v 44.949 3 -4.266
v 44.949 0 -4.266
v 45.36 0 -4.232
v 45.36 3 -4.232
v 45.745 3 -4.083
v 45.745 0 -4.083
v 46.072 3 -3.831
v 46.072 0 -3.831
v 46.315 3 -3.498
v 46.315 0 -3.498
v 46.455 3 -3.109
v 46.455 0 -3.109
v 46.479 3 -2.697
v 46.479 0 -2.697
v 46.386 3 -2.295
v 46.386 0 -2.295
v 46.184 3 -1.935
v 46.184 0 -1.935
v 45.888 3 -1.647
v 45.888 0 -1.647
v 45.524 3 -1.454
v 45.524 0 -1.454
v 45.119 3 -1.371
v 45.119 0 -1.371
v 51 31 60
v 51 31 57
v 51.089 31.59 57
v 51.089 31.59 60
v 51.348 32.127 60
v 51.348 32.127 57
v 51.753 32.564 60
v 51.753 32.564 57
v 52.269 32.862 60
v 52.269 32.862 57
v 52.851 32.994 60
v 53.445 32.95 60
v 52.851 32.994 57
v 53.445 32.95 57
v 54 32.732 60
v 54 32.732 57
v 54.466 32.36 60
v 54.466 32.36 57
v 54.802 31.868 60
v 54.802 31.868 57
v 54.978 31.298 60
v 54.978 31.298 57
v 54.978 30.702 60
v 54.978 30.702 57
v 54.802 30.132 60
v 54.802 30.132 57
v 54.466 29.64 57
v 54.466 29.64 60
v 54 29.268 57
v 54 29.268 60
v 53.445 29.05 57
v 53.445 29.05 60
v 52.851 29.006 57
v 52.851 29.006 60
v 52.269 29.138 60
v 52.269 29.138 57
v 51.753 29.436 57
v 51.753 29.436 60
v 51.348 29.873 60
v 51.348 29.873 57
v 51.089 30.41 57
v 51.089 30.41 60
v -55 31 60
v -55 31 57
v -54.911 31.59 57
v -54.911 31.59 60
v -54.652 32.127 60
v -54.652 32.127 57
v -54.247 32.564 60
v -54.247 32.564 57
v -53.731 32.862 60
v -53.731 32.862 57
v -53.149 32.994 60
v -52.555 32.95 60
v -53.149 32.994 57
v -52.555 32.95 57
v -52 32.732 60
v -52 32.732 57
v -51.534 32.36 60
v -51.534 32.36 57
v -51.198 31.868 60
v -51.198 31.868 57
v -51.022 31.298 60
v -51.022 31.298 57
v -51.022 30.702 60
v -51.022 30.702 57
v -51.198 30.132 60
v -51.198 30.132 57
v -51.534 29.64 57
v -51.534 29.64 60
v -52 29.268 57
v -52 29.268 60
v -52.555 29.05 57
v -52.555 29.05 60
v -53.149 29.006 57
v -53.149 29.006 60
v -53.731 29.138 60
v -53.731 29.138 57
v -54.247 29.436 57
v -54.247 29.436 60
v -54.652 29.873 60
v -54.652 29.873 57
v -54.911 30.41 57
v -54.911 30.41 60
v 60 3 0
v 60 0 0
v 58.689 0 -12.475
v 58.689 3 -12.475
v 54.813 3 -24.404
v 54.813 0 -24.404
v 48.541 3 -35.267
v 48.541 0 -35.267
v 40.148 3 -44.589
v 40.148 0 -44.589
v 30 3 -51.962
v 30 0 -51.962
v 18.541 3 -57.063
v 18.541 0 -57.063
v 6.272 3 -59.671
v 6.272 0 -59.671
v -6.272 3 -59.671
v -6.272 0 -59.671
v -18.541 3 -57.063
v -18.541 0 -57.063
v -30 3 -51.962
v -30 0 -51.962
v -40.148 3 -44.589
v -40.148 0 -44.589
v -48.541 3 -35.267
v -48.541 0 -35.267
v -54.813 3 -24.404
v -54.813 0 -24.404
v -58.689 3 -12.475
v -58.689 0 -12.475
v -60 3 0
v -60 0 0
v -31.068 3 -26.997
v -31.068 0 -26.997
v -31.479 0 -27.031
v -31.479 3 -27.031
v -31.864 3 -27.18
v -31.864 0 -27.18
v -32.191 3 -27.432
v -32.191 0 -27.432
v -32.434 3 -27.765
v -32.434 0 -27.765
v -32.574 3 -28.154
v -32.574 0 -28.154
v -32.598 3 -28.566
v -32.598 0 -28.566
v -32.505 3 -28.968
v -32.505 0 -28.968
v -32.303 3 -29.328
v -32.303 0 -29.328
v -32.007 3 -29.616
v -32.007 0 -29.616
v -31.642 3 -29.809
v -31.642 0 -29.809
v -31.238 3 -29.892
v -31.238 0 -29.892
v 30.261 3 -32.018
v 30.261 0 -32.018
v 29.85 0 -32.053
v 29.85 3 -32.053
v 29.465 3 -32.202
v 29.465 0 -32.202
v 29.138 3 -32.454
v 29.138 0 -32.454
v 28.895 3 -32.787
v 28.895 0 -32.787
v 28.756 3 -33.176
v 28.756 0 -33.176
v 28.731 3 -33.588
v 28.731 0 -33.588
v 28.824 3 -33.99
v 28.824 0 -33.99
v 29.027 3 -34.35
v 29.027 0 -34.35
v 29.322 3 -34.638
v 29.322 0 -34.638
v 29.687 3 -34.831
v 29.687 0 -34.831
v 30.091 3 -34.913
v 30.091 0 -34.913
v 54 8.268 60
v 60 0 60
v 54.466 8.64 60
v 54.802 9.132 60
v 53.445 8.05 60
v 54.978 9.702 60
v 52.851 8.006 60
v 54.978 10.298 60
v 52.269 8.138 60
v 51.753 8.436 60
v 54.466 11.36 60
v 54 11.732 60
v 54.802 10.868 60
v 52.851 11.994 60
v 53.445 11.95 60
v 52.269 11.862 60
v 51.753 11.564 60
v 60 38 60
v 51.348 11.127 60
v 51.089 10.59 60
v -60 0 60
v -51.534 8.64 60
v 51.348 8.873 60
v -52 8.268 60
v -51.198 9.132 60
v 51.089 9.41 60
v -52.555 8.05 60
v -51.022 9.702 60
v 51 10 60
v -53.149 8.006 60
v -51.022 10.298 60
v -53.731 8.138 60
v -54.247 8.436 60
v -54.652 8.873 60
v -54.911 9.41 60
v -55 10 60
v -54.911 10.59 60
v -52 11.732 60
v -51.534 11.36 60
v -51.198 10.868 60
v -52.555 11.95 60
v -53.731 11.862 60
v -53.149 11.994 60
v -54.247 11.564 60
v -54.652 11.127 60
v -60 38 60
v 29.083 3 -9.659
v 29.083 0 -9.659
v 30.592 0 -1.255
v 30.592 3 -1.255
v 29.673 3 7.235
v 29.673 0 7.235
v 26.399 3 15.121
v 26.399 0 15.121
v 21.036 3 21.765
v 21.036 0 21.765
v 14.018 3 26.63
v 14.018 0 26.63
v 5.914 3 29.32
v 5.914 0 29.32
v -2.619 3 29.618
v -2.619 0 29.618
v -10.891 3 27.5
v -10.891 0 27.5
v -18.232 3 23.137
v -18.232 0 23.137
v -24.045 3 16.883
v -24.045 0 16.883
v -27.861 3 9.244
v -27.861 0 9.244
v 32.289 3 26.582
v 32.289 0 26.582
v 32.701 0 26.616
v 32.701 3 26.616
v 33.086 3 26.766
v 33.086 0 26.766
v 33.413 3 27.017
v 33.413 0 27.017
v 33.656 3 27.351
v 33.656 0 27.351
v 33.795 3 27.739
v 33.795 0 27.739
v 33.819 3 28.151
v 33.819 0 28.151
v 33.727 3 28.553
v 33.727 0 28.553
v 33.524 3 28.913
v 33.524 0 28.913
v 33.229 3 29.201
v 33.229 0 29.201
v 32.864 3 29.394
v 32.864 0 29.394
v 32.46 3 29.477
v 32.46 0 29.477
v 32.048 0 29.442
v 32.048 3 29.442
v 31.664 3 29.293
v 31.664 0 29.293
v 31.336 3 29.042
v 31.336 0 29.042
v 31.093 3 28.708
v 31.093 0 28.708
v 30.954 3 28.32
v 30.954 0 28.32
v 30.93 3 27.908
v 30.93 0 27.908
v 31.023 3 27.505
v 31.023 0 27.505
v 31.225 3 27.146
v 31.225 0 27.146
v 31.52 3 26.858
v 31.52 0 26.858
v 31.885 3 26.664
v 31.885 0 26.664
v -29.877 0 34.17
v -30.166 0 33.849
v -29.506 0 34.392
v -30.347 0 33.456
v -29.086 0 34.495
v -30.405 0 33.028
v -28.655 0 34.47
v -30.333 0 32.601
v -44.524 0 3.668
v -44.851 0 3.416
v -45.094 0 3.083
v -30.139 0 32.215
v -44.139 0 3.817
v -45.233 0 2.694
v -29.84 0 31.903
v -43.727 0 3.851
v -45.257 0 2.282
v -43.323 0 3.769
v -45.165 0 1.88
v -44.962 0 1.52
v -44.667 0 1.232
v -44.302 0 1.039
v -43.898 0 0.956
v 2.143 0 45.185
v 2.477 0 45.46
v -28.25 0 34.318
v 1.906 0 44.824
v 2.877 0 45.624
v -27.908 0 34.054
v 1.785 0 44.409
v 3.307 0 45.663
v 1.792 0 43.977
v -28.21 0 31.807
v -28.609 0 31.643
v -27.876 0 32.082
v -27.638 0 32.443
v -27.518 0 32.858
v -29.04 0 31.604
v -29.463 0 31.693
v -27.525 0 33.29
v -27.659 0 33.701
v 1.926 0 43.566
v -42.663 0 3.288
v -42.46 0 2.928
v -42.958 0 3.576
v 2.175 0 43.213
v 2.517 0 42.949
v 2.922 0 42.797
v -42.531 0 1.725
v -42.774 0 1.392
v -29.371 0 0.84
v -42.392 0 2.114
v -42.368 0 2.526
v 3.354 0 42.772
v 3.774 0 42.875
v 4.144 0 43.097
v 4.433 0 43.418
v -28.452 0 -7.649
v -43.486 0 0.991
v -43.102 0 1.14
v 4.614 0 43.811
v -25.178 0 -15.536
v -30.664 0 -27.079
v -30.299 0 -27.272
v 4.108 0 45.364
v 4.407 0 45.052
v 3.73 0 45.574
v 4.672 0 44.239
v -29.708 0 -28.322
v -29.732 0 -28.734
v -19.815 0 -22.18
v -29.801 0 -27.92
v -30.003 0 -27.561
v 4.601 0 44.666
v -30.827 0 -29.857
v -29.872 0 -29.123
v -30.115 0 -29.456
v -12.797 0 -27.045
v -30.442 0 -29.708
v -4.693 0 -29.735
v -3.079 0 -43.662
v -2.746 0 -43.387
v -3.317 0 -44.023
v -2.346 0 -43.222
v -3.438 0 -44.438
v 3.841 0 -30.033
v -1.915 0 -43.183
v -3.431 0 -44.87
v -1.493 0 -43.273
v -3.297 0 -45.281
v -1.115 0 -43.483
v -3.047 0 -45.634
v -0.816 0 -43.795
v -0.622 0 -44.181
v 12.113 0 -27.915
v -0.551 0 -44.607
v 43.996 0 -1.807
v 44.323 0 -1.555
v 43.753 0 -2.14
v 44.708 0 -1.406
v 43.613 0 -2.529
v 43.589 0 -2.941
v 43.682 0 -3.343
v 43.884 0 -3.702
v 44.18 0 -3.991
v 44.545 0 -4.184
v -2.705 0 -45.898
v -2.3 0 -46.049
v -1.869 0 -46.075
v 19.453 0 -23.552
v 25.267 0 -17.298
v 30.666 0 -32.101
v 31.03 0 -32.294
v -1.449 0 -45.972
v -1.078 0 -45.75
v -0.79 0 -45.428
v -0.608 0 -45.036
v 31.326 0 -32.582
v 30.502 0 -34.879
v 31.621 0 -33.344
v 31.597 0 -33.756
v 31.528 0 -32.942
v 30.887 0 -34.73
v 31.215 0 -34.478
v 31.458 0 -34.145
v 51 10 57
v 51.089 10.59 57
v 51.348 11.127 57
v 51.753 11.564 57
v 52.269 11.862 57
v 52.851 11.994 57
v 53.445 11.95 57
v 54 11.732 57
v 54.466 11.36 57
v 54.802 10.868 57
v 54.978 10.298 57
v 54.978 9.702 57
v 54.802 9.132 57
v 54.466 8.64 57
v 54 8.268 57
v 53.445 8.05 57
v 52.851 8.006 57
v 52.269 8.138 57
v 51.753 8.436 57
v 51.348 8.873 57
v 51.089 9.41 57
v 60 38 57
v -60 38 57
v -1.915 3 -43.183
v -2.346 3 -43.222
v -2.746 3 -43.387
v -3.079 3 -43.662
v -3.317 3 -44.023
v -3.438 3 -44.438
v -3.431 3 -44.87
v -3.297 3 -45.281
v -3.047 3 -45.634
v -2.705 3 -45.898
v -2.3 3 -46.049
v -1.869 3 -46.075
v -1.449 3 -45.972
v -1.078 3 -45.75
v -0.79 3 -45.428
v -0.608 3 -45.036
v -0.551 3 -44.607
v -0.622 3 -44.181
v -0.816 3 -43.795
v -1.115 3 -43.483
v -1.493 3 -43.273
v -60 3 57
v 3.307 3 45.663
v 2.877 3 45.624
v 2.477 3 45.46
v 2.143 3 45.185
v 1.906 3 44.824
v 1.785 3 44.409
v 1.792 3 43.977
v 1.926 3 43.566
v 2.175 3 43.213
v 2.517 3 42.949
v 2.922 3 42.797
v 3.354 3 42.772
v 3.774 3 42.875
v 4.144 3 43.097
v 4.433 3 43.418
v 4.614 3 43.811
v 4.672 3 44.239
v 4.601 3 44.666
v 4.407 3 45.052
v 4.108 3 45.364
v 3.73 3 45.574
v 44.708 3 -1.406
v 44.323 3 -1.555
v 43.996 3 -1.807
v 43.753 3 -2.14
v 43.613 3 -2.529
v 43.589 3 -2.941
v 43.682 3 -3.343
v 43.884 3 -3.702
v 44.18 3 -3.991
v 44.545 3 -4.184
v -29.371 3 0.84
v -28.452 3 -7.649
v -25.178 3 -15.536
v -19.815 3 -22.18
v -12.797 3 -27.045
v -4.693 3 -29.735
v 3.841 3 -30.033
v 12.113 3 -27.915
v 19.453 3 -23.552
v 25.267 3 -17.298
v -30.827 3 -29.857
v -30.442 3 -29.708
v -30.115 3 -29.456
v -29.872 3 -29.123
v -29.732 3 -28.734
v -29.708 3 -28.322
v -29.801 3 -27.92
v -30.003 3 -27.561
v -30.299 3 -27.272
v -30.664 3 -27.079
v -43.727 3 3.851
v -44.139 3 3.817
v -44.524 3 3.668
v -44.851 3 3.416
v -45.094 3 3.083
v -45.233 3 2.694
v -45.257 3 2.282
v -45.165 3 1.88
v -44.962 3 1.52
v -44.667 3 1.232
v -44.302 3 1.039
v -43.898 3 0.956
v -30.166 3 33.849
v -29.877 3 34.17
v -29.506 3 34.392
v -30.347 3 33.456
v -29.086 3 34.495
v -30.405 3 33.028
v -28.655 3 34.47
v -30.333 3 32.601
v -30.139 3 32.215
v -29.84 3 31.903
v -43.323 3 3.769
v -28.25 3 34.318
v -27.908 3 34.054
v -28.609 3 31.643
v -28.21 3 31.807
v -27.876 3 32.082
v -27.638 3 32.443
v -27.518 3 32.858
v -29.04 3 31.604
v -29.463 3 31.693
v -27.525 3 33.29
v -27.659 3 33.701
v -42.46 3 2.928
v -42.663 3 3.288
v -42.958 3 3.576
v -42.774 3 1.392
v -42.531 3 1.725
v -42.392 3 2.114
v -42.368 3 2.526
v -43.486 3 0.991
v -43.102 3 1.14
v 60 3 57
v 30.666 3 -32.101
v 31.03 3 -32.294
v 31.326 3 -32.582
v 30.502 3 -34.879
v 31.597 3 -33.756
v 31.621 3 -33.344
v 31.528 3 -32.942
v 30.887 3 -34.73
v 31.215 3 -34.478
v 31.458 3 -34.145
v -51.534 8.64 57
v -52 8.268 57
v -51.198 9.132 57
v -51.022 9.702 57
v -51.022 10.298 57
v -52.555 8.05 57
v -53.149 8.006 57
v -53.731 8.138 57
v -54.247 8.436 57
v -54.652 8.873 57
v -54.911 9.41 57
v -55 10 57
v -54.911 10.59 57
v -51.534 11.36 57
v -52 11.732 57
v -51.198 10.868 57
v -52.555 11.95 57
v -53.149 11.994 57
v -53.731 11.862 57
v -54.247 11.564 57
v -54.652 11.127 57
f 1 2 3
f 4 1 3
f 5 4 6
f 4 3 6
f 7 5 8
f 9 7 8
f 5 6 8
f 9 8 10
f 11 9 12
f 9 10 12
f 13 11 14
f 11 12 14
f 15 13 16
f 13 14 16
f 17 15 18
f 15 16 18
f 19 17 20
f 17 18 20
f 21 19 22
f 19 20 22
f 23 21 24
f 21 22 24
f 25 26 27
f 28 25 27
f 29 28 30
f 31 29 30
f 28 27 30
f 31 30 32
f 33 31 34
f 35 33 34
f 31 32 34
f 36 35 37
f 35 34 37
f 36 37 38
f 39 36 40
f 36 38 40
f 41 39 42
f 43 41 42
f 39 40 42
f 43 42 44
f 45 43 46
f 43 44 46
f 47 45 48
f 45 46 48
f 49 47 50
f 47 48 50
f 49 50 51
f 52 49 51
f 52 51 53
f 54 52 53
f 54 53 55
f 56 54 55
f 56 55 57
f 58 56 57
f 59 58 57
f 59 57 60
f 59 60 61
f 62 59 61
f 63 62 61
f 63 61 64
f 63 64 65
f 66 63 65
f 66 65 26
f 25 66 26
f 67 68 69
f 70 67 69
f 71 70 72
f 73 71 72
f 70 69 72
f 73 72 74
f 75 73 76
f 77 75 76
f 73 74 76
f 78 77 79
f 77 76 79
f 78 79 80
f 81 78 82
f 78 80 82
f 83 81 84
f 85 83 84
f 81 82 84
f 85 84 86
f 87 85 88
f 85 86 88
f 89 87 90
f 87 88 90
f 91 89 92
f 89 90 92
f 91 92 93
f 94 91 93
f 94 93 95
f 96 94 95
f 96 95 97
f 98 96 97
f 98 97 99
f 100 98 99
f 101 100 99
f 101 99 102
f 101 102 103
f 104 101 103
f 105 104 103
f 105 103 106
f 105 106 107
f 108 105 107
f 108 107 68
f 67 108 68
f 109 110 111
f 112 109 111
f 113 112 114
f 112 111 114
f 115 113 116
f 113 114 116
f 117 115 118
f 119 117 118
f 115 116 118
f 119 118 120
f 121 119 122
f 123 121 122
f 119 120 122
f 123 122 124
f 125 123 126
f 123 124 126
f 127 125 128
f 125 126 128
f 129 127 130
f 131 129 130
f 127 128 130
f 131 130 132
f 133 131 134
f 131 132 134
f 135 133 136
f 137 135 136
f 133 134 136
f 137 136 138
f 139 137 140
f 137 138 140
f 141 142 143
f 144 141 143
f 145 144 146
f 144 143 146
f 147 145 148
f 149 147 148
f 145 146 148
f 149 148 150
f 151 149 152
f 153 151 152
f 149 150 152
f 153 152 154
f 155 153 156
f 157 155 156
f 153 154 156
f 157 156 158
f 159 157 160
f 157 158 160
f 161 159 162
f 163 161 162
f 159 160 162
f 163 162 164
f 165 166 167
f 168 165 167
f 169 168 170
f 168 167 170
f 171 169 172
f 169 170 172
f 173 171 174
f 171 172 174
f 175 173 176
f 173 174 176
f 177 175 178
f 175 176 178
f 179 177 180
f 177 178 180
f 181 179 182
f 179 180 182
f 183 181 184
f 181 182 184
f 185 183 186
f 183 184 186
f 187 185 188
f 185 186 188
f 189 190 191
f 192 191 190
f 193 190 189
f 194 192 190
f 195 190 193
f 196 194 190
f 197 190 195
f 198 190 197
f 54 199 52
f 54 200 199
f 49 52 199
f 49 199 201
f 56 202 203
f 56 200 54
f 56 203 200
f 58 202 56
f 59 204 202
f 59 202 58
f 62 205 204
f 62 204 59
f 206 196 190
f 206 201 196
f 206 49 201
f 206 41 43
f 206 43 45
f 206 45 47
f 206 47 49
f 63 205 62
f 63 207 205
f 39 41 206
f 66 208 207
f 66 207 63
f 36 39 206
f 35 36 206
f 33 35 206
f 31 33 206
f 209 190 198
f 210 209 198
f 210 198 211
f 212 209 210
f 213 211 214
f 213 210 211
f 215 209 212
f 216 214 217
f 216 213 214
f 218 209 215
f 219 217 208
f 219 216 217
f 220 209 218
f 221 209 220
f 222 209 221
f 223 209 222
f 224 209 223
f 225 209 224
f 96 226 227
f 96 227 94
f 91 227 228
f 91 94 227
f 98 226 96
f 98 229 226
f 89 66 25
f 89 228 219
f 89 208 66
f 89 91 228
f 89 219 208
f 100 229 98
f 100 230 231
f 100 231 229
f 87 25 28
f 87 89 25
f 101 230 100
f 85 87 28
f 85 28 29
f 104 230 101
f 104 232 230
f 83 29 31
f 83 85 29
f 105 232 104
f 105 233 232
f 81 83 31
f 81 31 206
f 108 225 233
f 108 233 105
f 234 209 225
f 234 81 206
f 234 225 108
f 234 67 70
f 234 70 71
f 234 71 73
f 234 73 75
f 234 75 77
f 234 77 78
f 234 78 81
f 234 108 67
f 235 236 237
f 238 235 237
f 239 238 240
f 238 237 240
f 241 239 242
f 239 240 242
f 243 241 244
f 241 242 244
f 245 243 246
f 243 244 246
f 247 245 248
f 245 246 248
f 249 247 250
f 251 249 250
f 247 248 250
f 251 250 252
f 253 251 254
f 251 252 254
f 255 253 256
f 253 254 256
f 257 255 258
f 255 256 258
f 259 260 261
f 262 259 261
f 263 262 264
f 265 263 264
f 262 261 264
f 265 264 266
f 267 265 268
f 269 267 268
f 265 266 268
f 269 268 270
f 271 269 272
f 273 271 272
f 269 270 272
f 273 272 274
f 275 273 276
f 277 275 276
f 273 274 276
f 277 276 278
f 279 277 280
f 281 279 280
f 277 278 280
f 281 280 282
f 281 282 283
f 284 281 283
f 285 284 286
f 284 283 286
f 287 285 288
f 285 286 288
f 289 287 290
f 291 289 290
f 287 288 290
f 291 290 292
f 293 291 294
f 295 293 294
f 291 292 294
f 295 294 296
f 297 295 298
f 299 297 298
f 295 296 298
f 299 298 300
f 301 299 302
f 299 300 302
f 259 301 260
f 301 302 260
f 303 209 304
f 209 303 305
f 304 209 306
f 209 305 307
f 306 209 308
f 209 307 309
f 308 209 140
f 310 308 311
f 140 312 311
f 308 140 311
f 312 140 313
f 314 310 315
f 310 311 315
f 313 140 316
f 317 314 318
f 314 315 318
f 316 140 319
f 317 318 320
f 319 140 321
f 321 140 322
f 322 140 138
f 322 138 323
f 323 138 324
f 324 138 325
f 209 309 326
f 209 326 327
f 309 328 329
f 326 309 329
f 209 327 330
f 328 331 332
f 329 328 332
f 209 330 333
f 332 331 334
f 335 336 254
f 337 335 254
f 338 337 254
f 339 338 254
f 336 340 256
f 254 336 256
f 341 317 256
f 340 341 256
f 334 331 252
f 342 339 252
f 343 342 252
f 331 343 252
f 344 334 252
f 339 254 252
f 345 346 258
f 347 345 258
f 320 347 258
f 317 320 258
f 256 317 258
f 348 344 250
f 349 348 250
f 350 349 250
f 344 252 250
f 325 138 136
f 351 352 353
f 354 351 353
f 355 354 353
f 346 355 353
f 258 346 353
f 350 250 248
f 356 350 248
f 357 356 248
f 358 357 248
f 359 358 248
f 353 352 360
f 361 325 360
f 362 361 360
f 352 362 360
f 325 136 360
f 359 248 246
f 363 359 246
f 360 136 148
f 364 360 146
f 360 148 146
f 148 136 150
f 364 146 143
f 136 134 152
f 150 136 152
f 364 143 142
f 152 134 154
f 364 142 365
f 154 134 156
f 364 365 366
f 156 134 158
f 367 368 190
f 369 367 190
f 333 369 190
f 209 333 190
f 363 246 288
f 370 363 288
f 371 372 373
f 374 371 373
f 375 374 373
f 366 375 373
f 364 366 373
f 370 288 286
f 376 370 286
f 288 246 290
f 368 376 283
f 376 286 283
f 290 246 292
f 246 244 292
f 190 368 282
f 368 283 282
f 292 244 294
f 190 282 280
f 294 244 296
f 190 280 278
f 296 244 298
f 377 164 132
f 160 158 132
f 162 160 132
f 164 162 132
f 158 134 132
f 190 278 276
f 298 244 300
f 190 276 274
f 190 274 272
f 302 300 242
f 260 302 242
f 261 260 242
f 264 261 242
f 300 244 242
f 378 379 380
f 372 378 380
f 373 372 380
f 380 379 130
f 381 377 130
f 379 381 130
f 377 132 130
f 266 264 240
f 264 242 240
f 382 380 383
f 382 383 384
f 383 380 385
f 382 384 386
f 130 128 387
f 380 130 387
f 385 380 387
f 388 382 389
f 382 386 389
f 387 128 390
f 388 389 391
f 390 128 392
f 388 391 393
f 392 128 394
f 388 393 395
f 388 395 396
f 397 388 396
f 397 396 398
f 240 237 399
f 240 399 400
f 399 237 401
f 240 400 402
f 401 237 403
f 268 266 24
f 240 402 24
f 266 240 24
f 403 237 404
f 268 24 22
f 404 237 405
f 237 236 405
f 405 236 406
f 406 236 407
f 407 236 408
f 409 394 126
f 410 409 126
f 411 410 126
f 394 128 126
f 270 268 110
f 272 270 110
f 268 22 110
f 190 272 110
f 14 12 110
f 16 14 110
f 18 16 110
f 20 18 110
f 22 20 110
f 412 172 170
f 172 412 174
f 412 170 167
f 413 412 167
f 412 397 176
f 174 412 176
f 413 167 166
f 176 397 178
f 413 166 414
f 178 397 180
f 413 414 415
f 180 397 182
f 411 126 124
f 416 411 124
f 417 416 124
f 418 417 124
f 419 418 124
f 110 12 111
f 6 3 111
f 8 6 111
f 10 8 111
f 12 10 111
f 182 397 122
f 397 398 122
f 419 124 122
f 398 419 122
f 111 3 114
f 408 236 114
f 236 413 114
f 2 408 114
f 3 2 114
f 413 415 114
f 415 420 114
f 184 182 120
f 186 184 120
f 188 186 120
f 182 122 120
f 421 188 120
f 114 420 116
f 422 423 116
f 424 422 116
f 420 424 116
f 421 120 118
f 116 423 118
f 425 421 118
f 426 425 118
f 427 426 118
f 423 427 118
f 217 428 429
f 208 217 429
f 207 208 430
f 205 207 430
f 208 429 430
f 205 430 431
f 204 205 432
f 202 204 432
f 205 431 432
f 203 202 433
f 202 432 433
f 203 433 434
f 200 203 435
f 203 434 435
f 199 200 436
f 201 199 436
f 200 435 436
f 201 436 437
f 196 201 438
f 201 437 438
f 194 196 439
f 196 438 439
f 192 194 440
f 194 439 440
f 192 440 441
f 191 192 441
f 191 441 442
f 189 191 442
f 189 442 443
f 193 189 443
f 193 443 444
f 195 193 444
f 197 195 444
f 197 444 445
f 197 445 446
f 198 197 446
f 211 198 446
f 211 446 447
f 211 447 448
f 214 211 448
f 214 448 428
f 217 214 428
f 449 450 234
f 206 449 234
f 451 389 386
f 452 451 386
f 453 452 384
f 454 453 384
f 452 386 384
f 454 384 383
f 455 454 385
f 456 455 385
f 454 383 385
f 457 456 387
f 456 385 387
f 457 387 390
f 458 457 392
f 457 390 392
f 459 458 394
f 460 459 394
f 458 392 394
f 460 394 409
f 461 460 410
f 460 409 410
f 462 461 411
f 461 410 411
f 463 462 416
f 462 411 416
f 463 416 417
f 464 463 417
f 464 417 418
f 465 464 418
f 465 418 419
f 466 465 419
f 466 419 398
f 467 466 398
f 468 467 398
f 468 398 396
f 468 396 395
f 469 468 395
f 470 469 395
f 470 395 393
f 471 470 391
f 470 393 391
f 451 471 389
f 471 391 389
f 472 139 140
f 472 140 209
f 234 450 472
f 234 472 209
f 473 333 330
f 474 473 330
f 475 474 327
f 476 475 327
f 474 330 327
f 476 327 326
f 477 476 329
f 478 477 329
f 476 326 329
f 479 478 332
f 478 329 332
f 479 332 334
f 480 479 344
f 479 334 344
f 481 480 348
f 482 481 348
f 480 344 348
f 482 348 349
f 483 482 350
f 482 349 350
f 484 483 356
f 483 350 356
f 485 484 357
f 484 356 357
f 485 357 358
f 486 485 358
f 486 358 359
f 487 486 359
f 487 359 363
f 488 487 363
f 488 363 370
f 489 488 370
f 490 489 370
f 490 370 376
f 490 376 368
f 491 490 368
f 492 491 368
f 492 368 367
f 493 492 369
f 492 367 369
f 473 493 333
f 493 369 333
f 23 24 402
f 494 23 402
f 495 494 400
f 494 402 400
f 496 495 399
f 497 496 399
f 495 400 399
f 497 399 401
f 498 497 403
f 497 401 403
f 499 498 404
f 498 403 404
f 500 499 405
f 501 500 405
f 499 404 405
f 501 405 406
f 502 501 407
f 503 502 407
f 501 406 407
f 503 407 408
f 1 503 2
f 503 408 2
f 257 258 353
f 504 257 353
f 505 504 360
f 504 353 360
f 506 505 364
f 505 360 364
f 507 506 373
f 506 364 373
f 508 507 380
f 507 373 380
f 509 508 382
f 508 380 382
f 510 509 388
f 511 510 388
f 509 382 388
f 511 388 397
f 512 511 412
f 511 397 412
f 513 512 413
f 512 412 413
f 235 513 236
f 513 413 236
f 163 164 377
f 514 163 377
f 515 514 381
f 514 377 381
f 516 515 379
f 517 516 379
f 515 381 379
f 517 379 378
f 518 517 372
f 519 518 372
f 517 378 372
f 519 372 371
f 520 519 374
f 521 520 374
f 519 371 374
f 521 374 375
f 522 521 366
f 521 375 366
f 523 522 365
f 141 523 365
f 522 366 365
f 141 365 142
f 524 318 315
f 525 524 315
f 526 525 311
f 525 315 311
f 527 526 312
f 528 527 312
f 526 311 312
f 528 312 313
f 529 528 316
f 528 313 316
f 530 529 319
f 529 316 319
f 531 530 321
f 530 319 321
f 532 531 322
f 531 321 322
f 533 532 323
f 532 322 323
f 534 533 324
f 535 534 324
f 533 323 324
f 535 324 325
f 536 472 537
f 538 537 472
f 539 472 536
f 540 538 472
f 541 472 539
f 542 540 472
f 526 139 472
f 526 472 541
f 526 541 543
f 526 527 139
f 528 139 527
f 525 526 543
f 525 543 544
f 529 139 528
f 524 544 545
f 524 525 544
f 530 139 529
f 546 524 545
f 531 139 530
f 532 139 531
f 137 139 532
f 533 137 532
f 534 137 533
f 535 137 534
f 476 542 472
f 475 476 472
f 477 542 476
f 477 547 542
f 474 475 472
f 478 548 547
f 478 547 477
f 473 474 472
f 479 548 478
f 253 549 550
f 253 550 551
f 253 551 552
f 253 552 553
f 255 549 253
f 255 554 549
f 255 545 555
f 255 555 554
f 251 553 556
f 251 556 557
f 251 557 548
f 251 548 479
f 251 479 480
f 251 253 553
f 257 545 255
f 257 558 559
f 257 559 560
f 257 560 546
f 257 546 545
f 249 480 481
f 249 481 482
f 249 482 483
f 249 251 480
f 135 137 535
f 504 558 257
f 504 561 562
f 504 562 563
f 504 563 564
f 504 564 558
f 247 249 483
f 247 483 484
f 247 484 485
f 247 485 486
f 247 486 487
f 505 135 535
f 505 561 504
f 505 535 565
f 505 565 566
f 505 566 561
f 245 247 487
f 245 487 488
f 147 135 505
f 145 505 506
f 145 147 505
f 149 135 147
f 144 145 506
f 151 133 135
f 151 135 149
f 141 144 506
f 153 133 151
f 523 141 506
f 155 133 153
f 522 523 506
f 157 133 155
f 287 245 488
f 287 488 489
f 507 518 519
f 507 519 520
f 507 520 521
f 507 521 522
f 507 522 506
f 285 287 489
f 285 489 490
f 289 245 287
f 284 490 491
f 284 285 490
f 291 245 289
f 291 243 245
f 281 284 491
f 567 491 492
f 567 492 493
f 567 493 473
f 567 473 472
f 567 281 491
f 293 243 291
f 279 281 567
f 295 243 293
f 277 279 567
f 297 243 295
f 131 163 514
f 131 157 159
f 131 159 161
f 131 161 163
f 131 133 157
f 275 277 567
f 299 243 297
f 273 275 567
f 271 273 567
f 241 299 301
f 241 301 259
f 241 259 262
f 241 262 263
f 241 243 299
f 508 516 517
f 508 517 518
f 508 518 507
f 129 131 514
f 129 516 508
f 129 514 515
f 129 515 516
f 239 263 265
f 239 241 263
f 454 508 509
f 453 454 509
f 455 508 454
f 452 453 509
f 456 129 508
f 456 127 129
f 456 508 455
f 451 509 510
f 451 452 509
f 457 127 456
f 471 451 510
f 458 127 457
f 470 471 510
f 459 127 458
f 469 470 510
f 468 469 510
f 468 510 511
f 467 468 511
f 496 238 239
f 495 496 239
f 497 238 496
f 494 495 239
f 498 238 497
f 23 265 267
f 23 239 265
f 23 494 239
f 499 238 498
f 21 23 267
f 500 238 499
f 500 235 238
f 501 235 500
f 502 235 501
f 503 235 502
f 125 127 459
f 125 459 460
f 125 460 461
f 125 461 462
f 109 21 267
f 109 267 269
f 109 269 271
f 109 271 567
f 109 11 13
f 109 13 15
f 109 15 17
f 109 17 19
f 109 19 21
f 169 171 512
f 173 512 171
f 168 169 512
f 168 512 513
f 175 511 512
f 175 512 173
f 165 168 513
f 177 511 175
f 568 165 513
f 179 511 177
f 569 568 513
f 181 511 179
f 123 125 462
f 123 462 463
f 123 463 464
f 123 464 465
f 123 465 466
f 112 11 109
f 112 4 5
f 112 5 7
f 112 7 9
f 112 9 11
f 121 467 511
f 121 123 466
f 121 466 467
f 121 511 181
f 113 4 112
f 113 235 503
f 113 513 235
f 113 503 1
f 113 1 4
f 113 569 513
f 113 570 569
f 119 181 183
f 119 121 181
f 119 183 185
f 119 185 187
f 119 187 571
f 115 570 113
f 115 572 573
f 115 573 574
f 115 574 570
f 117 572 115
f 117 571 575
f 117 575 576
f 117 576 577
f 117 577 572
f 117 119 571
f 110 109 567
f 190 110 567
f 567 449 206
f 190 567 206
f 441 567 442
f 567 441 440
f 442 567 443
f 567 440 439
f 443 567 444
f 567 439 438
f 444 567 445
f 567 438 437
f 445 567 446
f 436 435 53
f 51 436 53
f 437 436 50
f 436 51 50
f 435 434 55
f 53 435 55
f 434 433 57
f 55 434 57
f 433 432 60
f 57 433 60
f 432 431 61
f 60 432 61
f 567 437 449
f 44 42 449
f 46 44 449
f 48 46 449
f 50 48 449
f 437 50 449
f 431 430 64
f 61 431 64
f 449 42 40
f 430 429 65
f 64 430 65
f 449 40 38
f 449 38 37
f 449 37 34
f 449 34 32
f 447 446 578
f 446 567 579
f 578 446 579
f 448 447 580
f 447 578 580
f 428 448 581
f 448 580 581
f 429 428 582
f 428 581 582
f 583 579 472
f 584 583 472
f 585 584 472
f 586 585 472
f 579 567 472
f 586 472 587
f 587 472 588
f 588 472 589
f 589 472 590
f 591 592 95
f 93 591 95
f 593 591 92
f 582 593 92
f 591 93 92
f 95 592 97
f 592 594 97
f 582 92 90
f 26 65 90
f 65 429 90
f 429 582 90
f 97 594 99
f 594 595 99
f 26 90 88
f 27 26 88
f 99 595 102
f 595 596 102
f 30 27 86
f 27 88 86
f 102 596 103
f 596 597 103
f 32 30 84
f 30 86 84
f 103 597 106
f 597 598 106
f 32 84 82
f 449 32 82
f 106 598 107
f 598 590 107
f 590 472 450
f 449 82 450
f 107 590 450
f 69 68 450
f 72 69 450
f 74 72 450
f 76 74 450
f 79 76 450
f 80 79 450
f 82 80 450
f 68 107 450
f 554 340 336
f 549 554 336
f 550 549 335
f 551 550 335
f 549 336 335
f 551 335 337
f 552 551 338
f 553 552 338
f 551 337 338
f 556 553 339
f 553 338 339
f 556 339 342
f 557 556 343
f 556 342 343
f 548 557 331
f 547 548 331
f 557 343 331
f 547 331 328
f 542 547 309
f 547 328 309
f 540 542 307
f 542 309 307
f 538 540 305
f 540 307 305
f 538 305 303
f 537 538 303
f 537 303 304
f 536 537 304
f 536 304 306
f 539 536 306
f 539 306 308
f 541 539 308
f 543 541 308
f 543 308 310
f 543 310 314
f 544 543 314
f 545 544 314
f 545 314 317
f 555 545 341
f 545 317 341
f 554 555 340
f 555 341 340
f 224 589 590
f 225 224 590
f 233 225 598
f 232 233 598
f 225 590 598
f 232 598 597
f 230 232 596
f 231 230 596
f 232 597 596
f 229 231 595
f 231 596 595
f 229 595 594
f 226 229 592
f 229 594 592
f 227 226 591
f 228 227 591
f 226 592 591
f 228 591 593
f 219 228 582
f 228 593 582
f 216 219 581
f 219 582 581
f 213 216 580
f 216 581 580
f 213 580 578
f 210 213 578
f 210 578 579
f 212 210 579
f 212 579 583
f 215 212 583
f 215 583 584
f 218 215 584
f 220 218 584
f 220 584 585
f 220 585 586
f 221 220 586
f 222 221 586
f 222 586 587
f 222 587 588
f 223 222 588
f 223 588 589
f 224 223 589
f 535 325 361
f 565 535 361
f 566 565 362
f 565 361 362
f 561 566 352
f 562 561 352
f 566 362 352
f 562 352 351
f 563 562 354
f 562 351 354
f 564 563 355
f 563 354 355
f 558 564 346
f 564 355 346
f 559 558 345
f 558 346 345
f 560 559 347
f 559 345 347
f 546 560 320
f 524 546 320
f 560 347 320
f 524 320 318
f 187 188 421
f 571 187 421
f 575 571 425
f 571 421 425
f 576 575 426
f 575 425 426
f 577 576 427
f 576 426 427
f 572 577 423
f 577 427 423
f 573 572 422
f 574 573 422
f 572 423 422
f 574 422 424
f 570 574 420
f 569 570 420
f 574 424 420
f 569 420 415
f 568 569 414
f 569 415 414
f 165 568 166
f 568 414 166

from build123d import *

# Parameters (mm, degrees)
BOSS_EXTRUDE1_DEPTH = 3
SKETCH2_W           = 3
SKETCH2_H           = 35
BOSS_EXTRUDE2_DEPTH = 120
SKETCH3_R           = 2
CUT_EXTRUDE1_DEPTH  = 10


with BuildPart() as part:
    # Sketch1 → Boss-Extrude1 (new body)
    with BuildSketch(Plane(origin=(0, 0, 0), x_dir=(1, 0, 0), z_dir=(0, 1, 0))):
        with BuildLine():
            ThreePointArc((60, 0), (0, 60), (-60, 0))
            Line((-60, 0), (-60, -60))
            Line((-60, -60), (60, -60))
            Line((60, -60), (60, 0))
        make_face()
        with BuildLine():
            ThreePointArc((-28.86964292, -34.498602179), (-30.402233374, -33.136190163), (-29.039821358, -31.603599709))
            ThreePointArc((-29.039821358, -31.603599709), (-27.507230904, -32.966011725), (-28.86964292, -34.498602179))
        make_face(mode=Mode.SUBTRACT)
        with BuildLine():
            ThreePointArc((-43.727439791, -3.851425062), (-45.260030245, -2.489013046), (-43.89761823, -0.956422592))
            ThreePointArc((-43.89761823, -0.956422592), (-42.365027776, -2.318834608), (-43.727439791, -3.851425062))
        make_face(mode=Mode.SUBTRACT)
        with BuildLine():
            ThreePointArc((3.137054327, -42.768377551), (4.669644781, -44.130789567), (3.307232765, -45.663380021))
            ThreePointArc((3.307232765, -45.663380021), (1.774642311, -44.300968005), (3.137054327, -42.768377551))
        make_face(mode=Mode.SUBTRACT)
        with BuildLine():
            ThreePointArc((32.289465784, -26.581793404), (33.822056238, -27.944205419), (32.459644223, -29.476795874))
            ThreePointArc((32.459644223, -29.476795874), (30.927053769, -28.114383858), (32.289465784, -26.581793404))
        make_face(mode=Mode.SUBTRACT)
        with BuildLine():
            ThreePointArc((-31.06789629, 26.996663347), (-32.600486744, 28.359075363), (-31.238074729, 29.891665817))
            ThreePointArc((-31.238074729, 29.891665817), (-29.705484275, 28.529253801), (-31.06789629, 26.996663347))
        make_face(mode=Mode.SUBTRACT)
        with BuildLine():
            ThreePointArc((-2.085663271, 46.078249964), (-0.553072817, 44.715837949), (-1.915484832, 43.183247495))
            ThreePointArc((-1.915484832, 43.183247495), (-3.448075286, 44.54565951), (-2.085663271, 46.078249964))
        make_face(mode=Mode.SUBTRACT)
        with BuildLine():
            ThreePointArc((29.082980246, 9.659105906), (10.062455681, -28.264760528), (-27.861410752, -9.244235963))
            ThreePointArc((-27.861410752, -9.244235963), (-8.840886187, 28.679630471), (29.082980246, 9.659105906))
        make_face(mode=Mode.SUBTRACT)
        with BuildLine():
            ThreePointArc((44.949009286, 4.266295005), (46.48159974, 2.90388299), (45.119187724, 1.371292536))
            ThreePointArc((45.119187724, 1.371292536), (43.58659727, 2.733704551), (44.949009286, 4.266295005))
        make_face(mode=Mode.SUBTRACT)
        with BuildLine():
            ThreePointArc((30.261390853, 32.018469652), (28.728800399, 33.380881668), (30.091212414, 34.913472122))
            ThreePointArc((30.091212414, 34.913472122), (31.623802868, 33.551060107), (30.261390853, 32.018469652))
        make_face(mode=Mode.SUBTRACT)
    extrude(amount=BOSS_EXTRUDE1_DEPTH)

    # Sketch2 → Boss-Extrude2 (add)
    with BuildSketch(Plane.ZY.offset(60)):
        with Locations((58.5, 20.5)):
            Rectangle(SKETCH2_W, SKETCH2_H)
    extrude(amount=-BOSS_EXTRUDE2_DEPTH)

    # Sketch3 → Cut-Extrude1 (cut)
    with BuildSketch(Plane(origin=(0, 0, 57), x_dir=(-1, 0, 0), z_dir=(0, 0, -1))):
        with Locations((-53, 31)):
            Circle(SKETCH3_R)
        with Locations((53, 31)):
            Circle(SKETCH3_R)
        with Locations((53, 10)):
            Circle(SKETCH3_R)
        with Locations((-53, 10)):
            Circle(SKETCH3_R)
    extrude(amount=-CUT_EXTRUDE1_DEPTH, mode=Mode.SUBTRACT)


solid = part.part
